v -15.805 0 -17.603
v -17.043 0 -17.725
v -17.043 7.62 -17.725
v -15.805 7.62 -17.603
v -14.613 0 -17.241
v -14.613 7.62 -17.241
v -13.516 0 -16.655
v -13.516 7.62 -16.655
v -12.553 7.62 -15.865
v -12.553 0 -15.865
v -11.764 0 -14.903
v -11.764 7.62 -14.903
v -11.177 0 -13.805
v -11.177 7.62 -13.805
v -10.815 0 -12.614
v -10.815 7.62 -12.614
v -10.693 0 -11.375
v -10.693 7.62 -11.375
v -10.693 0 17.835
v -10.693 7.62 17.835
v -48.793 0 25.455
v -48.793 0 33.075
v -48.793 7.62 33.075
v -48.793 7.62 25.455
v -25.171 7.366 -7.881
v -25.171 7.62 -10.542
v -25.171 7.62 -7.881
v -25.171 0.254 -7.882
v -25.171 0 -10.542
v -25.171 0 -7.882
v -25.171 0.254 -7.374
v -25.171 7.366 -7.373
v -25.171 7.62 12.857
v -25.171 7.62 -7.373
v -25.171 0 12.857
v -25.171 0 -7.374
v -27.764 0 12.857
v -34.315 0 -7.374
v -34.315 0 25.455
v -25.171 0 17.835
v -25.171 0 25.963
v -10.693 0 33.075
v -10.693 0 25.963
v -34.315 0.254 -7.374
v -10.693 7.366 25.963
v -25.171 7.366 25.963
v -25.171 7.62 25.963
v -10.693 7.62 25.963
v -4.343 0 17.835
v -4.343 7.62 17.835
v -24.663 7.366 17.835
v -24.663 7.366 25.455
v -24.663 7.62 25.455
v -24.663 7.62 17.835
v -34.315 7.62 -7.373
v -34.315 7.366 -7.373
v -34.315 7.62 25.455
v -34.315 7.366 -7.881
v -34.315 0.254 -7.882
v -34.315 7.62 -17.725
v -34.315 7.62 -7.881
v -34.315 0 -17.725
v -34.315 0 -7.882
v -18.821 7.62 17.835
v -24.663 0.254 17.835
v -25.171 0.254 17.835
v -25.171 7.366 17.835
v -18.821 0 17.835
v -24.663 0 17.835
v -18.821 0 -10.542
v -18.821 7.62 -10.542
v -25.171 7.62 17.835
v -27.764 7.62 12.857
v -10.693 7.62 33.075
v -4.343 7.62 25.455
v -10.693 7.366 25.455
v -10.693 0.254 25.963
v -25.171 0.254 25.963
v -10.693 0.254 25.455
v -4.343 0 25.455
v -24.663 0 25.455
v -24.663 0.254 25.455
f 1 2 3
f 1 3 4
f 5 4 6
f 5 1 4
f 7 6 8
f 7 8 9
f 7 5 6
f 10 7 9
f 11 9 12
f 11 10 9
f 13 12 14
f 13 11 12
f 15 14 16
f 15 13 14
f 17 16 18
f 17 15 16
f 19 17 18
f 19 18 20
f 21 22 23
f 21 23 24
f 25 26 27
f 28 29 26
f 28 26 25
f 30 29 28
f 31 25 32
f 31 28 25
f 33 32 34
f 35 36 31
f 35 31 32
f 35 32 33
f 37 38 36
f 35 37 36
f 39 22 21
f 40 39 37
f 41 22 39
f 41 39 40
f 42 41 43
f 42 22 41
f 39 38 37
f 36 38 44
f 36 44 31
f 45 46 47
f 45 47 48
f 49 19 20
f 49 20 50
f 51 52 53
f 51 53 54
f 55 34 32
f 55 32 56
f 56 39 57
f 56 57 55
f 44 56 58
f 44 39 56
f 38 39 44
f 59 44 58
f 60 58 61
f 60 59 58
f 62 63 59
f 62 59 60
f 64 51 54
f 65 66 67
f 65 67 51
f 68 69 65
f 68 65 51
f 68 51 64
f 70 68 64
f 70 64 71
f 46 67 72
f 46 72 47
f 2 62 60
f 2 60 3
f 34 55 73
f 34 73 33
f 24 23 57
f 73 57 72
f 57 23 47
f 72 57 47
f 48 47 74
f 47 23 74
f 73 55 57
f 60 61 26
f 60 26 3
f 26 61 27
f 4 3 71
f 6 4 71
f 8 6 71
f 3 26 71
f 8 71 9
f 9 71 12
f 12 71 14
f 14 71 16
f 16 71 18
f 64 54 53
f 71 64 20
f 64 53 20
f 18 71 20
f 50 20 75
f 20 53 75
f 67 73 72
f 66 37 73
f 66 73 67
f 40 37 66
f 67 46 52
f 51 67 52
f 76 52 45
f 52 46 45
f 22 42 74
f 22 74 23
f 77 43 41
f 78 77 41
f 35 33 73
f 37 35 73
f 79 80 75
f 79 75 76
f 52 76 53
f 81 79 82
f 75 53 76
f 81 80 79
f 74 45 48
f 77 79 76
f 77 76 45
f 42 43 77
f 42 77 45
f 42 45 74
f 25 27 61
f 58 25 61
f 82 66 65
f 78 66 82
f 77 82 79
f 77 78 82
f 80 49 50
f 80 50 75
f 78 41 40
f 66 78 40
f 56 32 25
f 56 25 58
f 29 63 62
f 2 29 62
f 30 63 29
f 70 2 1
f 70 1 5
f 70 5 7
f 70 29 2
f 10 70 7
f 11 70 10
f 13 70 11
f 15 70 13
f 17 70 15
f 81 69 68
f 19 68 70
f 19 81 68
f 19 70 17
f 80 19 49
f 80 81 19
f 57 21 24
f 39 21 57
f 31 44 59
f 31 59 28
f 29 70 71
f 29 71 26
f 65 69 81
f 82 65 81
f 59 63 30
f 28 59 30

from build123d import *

# Parameters (mm, degrees)
F0_W     = 9.144
F0_H     = 0.508
F1_DEPTH = 7.62
F2_DEPTH = 7.366
F3_DEPTH = 0.254
F4_W     = 9.144
F4_H     = 0.508
F5_DEPTH = 0.254


with BuildPart() as f1:
    # F0 (on Front) → F1 (new body)
    with BuildSketch(Plane.XZ):
        Polygon((-10.693384, 33.075266), (-48.793384, 33.075266), (-48.793384, 25.455266), (-34.315384, 25.455266), (-34.315384, -7.374234), (-25.171384, -7.374234), (-25.171384, 12.856693), (-27.764196, 12.856693), (-25.171384, 17.835266), (-25.171384, 25.137766), (-25.171384, 25.455266), (-25.171384, 25.963266), (-10.693384, 25.963266), align=None)
        with Locations((-29.743384, -7.628234)):
            Rectangle(F0_W, F0_H)
        with BuildLine():
            Line((-4.343384, 25.455266), (-10.693384, 25.455266))
            Line((-10.693384, 25.455266), (-24.663384, 25.455266))
            Line((-24.663384, 25.455266), (-24.663384, 17.835266))
            Line((-24.663384, 17.835266), (-18.821384, 17.835266))
            Line((-18.821384, 17.835266), (-18.821384, -10.542493))
            Line((-18.821384, -10.542493), (-25.171384, -10.542493))
            Line((-25.171384, -10.542493), (-25.171384, -7.882234))
            Line((-25.171384, -7.882234), (-34.315384, -7.882234))
            Line((-34.315384, -7.882234), (-34.315384, -17.724734))
            Line((-34.315384, -17.724734), (-17.043384, -17.724734))
            ThreePointArc((-17.043384, -17.724734), (-12.553256, -15.864862), (-10.693384, -11.374734))
            Line((-10.693384, -11.374734), (-10.693384, 17.835266))
            Line((-10.693384, 17.835266), (-4.343384, 17.835266))
            Line((-4.343384, 17.835266), (-4.343384, 25.455266))
        make_face()
    extrude(amount=-F1_DEPTH)

    # F0 (on Front) → F2 (join)
    with BuildSketch(Plane.XZ):
        Polygon((-10.693384, 25.455266), (-10.693384, 25.963266), (-25.171384, 25.963266), (-25.171384, 25.455266), (-24.663384, 25.455266), align=None)
        Polygon((-24.663384, 25.455266), (-25.171384, 25.455266), (-25.171384, 25.137766), (-25.171384, 17.835266), (-24.663384, 17.835266), align=None)
        with Locations((-29.743384, -7.628234)):
            Rectangle(F0_W, F0_H)
    extrude(amount=-F2_DEPTH)

    # F0 (on Front) → F3 (cut)
    with BuildSketch(Plane.XZ):
        Polygon((-24.663384, 25.455266), (-25.171384, 25.455266), (-25.171384, 25.137766), (-25.171384, 17.835266), (-24.663384, 17.835266), align=None)
        Polygon((-10.693384, 25.455266), (-10.693384, 25.963266), (-25.171384, 25.963266), (-25.171384, 25.455266), (-24.663384, 25.455266), align=None)
        with Locations((-29.743384, -7.628234)):
            Rectangle(F0_W, F0_H)
    extrude(amount=-F3_DEPTH, mode=Mode.SUBTRACT)

    # F4 (on face) → F5 (cut)
    with BuildSketch(Plane(origin=(0, 7.62, 0), x_dir=(-1, 0, 0), z_dir=(0, 1, 0))):
        with Locations((29.743384, -7.62705)):
            Rectangle(F4_W, F4_H)
    extrude(amount=-F5_DEPTH, mode=Mode.SUBTRACT)


solid = f1.part
